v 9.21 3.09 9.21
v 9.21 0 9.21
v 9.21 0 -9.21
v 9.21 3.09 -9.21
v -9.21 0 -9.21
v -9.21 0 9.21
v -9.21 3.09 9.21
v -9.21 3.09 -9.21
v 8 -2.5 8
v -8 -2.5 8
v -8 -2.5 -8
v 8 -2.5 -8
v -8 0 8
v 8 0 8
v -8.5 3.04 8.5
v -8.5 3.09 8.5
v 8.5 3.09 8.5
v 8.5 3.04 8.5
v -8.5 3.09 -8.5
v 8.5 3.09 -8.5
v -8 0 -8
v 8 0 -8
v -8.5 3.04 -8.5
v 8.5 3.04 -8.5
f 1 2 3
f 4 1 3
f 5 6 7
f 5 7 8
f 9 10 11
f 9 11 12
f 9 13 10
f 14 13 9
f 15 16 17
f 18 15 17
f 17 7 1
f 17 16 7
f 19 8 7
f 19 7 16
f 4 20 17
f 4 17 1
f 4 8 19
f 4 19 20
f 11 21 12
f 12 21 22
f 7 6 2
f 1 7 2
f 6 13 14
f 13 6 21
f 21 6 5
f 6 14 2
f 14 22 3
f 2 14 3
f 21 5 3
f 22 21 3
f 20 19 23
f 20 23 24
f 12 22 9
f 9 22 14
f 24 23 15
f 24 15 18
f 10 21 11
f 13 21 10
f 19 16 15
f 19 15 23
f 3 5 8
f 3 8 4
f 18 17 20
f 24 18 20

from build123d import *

# Parameters (mm, degrees)
SKETCH1_W           = 18.42
SKETCH1_H           = 18.42
BOSS_EXTRUDE1_DEPTH = 3.09
SKETCH2_W           = 16
SKETCH2_H           = 16
BOSS_EXTRUDE2_DEPTH = 2.5
SKETCH4_W           = 17
SKETCH4_H           = 17
CUT_EXTRUDE1_DEPTH  = 0.05


with BuildPart() as part:
    # Sketch1 → Boss-Extrude1 (new body)
    with BuildSketch(Plane(origin=(0, 0, 0), x_dir=(1, 0, 0), z_dir=(0, 1, 0))):
        Rectangle(SKETCH1_W, SKETCH1_H)
    extrude(amount=BOSS_EXTRUDE1_DEPTH)

    # Sketch2 → Boss-Extrude2 (add)
    with BuildSketch(Plane.XZ):
        Rectangle(SKETCH2_W, SKETCH2_H)
    extrude(amount=BOSS_EXTRUDE2_DEPTH)

    # Sketch4 → Cut-Extrude1 (cut)
    with BuildSketch(Plane(origin=(0, 3.09, 0), x_dir=(1, 0, 0), z_dir=(0, 1, 0))):
        Rectangle(SKETCH4_W, SKETCH4_H)
    extrude(amount=-CUT_EXTRUDE1_DEPTH, mode=Mode.SUBTRACT)


solid = part.part
